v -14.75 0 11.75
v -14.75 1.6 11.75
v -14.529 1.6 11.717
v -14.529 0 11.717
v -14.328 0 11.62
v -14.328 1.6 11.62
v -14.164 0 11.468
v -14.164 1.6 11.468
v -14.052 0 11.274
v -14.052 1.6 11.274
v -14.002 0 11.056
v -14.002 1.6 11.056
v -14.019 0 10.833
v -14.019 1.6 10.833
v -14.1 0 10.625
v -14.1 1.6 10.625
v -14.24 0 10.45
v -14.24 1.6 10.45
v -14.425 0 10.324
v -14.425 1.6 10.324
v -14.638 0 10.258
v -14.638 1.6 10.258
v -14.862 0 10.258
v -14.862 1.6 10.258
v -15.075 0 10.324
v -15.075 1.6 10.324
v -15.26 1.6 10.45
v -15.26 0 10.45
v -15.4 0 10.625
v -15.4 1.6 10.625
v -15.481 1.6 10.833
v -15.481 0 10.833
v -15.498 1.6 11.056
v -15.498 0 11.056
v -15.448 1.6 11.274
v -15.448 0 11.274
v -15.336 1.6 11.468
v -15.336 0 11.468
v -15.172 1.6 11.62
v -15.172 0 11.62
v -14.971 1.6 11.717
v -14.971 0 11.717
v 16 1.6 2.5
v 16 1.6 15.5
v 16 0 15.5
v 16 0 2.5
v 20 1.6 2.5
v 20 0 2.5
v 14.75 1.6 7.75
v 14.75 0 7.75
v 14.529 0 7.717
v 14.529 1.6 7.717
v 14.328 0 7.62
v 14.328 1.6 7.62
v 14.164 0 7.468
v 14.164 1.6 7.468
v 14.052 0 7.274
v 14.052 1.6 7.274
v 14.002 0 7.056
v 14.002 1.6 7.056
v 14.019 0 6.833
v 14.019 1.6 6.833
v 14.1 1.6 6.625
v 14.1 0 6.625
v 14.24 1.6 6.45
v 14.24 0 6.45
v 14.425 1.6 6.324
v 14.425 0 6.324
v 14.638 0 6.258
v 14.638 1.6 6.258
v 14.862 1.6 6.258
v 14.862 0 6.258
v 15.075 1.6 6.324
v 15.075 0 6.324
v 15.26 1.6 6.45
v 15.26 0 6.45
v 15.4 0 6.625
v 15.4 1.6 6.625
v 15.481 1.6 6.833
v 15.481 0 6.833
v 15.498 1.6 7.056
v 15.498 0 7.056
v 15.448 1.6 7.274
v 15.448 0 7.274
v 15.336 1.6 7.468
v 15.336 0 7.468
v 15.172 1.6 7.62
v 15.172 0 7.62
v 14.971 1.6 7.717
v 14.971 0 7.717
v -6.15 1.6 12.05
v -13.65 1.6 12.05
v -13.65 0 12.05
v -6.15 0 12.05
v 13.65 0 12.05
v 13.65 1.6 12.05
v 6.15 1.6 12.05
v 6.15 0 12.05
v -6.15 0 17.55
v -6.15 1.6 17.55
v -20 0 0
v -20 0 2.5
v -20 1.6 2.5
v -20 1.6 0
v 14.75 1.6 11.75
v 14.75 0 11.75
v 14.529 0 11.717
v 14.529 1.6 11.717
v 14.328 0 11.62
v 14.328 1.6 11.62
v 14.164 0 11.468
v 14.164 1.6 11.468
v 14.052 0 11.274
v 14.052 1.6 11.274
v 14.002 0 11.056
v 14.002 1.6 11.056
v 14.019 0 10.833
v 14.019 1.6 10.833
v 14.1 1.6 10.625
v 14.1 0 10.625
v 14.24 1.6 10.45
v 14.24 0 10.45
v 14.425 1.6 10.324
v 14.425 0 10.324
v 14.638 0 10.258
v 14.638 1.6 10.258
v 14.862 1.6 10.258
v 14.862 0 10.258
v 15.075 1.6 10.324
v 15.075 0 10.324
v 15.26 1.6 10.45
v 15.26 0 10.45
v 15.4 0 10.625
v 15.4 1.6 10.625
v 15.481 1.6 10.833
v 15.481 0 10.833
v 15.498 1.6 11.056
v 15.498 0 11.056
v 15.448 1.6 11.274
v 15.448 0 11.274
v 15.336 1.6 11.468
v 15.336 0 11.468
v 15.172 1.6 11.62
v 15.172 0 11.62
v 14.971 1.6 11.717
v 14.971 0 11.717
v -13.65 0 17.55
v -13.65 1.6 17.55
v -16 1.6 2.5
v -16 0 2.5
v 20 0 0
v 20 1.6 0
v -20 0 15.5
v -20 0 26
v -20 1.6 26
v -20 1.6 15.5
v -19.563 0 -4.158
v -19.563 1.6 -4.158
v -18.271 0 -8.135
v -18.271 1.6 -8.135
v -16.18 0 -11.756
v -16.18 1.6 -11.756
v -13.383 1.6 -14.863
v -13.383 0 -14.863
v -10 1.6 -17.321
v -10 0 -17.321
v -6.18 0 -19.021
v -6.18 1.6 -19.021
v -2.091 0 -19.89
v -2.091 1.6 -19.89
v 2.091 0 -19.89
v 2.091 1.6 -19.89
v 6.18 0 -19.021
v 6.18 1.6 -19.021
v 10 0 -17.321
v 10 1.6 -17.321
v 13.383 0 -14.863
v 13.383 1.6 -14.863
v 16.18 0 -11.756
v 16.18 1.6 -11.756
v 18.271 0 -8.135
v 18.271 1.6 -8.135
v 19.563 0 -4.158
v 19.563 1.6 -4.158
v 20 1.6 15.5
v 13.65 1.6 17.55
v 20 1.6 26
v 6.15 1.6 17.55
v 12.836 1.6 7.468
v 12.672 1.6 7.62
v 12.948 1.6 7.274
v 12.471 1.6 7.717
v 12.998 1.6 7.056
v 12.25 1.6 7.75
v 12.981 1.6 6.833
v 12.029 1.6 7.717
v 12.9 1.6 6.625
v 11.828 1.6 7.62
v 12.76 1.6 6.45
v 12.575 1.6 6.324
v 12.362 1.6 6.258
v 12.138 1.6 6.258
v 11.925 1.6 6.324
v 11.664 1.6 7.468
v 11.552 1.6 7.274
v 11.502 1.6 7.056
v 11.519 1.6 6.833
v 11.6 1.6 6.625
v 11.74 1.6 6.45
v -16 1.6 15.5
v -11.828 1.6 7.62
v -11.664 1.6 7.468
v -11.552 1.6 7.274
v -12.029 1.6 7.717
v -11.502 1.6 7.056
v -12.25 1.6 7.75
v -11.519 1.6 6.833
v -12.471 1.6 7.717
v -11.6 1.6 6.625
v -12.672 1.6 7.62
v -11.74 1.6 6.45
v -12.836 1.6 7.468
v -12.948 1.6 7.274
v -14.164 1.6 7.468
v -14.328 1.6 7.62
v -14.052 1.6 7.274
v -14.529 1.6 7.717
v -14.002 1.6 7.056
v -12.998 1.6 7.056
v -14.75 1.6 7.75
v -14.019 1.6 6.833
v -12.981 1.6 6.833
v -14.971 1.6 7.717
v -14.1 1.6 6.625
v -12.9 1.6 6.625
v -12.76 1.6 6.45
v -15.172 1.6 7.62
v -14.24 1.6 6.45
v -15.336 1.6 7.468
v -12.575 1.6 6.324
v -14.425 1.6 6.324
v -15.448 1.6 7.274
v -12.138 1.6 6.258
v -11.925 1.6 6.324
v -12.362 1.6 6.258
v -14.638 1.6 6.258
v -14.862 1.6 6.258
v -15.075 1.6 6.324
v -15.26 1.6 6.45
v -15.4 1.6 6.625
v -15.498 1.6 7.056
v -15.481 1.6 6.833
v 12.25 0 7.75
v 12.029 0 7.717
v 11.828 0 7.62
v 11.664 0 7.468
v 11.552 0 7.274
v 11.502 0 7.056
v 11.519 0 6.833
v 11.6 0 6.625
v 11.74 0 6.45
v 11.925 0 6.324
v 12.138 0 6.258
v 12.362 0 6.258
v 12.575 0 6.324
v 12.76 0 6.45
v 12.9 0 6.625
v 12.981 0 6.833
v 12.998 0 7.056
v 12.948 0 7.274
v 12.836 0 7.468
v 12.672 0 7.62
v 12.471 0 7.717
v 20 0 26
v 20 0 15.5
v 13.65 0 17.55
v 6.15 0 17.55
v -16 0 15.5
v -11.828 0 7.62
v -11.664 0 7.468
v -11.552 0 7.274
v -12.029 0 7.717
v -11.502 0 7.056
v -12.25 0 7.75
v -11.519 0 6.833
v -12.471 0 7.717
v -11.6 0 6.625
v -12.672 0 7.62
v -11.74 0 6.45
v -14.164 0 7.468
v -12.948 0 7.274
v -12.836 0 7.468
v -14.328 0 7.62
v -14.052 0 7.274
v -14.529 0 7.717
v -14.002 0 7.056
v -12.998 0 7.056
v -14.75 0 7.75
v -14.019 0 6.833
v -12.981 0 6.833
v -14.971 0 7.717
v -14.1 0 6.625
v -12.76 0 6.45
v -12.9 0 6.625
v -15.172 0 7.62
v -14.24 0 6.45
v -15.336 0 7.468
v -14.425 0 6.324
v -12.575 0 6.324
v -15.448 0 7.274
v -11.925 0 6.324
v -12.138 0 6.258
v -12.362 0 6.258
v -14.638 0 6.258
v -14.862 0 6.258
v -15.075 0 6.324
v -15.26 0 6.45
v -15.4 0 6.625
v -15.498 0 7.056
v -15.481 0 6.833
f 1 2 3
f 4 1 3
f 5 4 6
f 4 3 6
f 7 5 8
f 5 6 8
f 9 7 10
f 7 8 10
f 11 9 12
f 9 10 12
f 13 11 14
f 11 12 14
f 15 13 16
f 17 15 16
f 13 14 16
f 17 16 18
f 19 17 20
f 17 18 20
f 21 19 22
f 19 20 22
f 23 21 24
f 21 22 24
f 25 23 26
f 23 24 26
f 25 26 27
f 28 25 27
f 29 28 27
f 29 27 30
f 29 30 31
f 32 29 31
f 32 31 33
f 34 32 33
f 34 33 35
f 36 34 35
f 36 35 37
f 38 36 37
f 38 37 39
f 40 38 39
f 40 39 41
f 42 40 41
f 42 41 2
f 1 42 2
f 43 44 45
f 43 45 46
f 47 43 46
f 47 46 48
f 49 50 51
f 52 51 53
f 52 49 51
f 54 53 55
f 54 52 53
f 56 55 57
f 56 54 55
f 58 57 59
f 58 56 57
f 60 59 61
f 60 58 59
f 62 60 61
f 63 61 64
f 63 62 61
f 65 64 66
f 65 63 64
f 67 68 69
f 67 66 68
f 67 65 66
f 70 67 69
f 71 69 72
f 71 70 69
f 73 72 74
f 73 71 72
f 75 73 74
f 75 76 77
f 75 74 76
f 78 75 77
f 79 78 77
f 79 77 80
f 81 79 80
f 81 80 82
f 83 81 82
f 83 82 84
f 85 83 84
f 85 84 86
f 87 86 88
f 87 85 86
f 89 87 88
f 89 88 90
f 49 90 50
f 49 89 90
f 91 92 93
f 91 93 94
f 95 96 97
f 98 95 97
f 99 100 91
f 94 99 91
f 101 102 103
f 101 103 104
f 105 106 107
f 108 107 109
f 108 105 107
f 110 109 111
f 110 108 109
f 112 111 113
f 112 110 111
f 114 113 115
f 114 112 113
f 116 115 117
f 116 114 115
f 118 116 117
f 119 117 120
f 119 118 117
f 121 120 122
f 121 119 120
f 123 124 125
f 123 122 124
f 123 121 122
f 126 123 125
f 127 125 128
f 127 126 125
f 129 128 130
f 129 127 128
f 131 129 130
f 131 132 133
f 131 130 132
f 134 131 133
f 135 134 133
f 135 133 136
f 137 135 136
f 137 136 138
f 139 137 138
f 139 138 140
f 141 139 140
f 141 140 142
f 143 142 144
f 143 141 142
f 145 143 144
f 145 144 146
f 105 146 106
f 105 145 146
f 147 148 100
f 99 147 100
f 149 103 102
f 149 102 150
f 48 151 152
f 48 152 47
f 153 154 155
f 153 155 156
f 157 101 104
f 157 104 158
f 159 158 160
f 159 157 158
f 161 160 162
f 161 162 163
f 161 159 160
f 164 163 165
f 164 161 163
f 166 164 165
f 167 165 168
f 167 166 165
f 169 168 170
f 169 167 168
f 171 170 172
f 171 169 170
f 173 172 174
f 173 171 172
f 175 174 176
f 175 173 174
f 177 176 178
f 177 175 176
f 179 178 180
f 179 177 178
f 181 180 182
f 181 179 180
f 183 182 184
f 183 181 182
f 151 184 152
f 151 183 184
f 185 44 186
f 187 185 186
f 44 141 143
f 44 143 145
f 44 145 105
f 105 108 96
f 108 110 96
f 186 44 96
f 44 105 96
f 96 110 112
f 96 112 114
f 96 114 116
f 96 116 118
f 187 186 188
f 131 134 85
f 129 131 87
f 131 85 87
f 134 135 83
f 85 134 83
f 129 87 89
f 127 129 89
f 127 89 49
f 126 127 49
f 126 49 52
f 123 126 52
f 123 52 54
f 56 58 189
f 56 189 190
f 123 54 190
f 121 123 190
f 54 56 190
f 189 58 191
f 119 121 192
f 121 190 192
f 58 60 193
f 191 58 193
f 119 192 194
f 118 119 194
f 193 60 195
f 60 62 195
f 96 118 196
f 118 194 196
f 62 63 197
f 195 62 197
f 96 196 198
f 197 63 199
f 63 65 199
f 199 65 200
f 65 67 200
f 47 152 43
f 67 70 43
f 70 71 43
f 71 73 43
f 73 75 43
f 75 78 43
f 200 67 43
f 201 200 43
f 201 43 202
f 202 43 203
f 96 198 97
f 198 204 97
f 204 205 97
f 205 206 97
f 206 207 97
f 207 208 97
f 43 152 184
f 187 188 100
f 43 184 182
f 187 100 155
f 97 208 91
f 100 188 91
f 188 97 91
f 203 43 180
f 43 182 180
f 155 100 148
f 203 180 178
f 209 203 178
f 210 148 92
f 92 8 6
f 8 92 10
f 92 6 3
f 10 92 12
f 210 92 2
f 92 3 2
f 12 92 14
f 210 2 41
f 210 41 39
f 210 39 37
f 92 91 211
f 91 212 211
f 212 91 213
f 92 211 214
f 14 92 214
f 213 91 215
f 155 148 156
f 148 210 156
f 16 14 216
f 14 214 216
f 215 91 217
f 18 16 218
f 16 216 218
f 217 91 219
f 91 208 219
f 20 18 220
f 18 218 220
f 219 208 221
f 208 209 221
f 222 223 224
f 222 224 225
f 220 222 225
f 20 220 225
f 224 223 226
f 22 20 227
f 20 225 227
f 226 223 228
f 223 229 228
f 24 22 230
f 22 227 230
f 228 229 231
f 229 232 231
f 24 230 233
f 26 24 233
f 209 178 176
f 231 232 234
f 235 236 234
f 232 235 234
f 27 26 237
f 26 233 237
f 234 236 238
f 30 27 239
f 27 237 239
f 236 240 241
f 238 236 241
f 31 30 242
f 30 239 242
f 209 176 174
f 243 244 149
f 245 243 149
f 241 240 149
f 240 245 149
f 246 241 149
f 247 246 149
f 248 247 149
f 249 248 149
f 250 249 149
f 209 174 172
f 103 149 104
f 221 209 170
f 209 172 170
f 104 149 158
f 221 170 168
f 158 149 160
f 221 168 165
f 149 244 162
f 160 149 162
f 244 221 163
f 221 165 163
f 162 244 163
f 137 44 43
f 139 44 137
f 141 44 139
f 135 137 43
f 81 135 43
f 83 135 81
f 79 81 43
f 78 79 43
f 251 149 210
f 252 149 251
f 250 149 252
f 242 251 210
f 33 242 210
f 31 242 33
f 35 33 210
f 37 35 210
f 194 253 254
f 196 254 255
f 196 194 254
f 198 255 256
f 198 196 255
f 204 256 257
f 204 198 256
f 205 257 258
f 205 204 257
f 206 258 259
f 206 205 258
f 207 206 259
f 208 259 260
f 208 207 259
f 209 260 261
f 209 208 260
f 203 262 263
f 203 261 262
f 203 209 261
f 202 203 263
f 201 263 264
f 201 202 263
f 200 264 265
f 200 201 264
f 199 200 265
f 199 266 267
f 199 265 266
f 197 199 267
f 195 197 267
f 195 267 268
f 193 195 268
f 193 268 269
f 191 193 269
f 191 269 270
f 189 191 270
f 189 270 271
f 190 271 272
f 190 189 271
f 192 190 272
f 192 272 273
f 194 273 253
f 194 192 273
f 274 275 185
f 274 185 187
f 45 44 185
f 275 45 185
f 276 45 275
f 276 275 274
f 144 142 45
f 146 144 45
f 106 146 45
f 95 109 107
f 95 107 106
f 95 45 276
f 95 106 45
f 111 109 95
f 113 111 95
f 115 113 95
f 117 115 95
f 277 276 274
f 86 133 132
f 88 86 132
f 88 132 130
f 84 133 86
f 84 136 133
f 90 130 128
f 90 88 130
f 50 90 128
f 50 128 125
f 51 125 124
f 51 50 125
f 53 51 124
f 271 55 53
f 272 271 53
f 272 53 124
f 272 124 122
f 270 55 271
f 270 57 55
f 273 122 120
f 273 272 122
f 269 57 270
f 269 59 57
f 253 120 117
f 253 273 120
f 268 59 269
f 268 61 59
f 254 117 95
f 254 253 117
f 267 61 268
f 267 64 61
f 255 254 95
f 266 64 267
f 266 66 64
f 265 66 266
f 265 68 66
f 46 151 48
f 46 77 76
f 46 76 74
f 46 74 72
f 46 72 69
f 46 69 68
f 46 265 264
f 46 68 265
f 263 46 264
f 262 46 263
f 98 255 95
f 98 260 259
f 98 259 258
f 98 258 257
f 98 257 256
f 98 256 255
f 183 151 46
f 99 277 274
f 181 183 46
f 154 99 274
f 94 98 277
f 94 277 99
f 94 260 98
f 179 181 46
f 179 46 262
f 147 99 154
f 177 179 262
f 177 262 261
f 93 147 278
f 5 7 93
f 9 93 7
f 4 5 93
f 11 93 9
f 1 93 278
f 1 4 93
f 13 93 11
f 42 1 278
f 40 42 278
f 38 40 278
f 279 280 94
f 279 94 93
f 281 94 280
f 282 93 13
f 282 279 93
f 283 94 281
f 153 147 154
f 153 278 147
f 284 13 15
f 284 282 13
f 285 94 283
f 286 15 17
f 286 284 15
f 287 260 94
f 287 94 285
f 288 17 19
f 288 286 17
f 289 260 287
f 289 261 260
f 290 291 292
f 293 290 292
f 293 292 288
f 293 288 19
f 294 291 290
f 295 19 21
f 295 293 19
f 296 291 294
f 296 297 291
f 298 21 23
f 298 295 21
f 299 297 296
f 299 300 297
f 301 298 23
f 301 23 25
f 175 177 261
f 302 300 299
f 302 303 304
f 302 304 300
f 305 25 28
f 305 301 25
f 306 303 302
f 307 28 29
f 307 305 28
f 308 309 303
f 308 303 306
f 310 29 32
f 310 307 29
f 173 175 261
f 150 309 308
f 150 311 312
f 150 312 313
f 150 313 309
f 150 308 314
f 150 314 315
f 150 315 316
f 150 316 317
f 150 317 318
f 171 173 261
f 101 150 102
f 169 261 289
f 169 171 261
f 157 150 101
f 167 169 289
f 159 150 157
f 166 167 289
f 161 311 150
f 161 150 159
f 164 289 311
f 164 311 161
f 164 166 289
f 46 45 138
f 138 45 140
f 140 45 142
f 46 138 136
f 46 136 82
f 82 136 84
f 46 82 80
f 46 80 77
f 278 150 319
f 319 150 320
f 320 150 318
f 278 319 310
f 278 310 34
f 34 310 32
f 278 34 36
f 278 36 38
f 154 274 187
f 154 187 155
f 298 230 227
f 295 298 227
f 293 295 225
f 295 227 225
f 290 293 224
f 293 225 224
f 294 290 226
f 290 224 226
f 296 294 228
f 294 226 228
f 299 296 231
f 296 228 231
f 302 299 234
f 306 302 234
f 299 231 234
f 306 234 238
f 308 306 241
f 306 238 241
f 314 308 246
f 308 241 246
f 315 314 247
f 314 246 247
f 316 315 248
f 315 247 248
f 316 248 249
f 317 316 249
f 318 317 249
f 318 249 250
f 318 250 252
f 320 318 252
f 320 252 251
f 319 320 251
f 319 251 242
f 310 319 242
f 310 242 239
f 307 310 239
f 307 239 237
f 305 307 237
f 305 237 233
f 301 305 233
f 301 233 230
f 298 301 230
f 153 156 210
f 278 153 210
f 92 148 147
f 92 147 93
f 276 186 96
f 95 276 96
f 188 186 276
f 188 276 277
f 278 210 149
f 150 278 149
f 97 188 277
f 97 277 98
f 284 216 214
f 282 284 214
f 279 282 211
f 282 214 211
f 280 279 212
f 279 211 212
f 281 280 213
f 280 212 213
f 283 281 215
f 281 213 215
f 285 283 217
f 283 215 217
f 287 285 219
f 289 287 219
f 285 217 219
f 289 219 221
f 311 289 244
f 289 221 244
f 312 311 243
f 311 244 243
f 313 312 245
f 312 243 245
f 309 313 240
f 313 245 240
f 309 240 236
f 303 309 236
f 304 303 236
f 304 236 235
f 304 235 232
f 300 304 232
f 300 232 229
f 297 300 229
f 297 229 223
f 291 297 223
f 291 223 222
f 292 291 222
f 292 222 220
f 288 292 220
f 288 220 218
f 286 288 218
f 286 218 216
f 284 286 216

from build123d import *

# Parameters (mm, degrees)
BOSS_EXTRUDE1_DEPTH = 1.6
SKETCH2_W           = 4
SKETCH2_H           = 13
CUT_EXTRUDE2_DEPTH  = 10
SKETCH3_W           = 7.5
SKETCH3_H           = 5.5
CUT_EXTRUDE3_DEPTH  = 10
SKETCH4_R           = 0.75
CUT_EXTRUDE4_DEPTH  = 10


with BuildPart() as part:
    # Sketch1 → Boss-Extrude1 (new body)
    with BuildSketch(Plane(origin=(0, 0, 0), x_dir=(1, 0, 0), z_dir=(0, 1, 0))):
        with BuildLine():
            Line((20, 0), (20, -26))
            Line((20, -26), (-20, -26))
            Line((-20, -26), (-20, 0))
            ThreePointArc((-20, 0), (0, 20), (20, 0))
        make_face()
    extrude(amount=BOSS_EXTRUDE1_DEPTH)

    # Sketch2 → Cut-Extrude2 (cut)
    with BuildSketch(Plane(origin=(0, 3, 0), x_dir=(1, 0, 0), z_dir=(0, 1, 0))):
        with Locations((-18, -9)):
            Rectangle(SKETCH2_W, SKETCH2_H)
        with Locations((18, -9)):
            Rectangle(SKETCH2_W, SKETCH2_H)
    extrude(amount=-CUT_EXTRUDE2_DEPTH, mode=Mode.SUBTRACT)

    # Sketch3 → Cut-Extrude3 (cut)
    with BuildSketch(Plane(origin=(0, 1.6, 0), x_dir=(1, 0, 0), z_dir=(0, 1, 0))):
        with Locations((-9.9, -14.8)):
            Rectangle(SKETCH3_W, SKETCH3_H)
    cut_extrude3 = extrude(amount=-CUT_EXTRUDE3_DEPTH, mode=Mode.SUBTRACT)

    # Mirror1: Cut-Extrude3 across plane
    add(cut_extrude3.mirror(Plane(origin=(0, 0, 0), x_dir=(0, 0, 1), z_dir=(1, 0, 0))), mode=Mode.SUBTRACT)

    # Sketch4 → Cut-Extrude4 (cut)
    with BuildSketch(Plane(origin=(0, 1.6, 0), x_dir=(1, 0, 0), z_dir=(0, 1, 0))):
        with Locations(Location((-14.75, -7, 0), (0, 0, 270))):
            Circle(SKETCH4_R)
        with Locations(Location((-14.75, -11, 0), (0, 0, 270))):
            Circle(SKETCH4_R)
        with Locations(Location((-12.25, -7, 0), (0, 0, 270))):
            Circle(SKETCH4_R)
    cut_extrude4 = extrude(amount=-CUT_EXTRUDE4_DEPTH, mode=Mode.SUBTRACT)

    # Mirror2: Cut-Extrude4 across plane
    add(cut_extrude4.mirror(Plane(origin=(0, 0, 0), x_dir=(0, 0, 1), z_dir=(1, 0, 0))), mode=Mode.SUBTRACT)


solid = part.part
